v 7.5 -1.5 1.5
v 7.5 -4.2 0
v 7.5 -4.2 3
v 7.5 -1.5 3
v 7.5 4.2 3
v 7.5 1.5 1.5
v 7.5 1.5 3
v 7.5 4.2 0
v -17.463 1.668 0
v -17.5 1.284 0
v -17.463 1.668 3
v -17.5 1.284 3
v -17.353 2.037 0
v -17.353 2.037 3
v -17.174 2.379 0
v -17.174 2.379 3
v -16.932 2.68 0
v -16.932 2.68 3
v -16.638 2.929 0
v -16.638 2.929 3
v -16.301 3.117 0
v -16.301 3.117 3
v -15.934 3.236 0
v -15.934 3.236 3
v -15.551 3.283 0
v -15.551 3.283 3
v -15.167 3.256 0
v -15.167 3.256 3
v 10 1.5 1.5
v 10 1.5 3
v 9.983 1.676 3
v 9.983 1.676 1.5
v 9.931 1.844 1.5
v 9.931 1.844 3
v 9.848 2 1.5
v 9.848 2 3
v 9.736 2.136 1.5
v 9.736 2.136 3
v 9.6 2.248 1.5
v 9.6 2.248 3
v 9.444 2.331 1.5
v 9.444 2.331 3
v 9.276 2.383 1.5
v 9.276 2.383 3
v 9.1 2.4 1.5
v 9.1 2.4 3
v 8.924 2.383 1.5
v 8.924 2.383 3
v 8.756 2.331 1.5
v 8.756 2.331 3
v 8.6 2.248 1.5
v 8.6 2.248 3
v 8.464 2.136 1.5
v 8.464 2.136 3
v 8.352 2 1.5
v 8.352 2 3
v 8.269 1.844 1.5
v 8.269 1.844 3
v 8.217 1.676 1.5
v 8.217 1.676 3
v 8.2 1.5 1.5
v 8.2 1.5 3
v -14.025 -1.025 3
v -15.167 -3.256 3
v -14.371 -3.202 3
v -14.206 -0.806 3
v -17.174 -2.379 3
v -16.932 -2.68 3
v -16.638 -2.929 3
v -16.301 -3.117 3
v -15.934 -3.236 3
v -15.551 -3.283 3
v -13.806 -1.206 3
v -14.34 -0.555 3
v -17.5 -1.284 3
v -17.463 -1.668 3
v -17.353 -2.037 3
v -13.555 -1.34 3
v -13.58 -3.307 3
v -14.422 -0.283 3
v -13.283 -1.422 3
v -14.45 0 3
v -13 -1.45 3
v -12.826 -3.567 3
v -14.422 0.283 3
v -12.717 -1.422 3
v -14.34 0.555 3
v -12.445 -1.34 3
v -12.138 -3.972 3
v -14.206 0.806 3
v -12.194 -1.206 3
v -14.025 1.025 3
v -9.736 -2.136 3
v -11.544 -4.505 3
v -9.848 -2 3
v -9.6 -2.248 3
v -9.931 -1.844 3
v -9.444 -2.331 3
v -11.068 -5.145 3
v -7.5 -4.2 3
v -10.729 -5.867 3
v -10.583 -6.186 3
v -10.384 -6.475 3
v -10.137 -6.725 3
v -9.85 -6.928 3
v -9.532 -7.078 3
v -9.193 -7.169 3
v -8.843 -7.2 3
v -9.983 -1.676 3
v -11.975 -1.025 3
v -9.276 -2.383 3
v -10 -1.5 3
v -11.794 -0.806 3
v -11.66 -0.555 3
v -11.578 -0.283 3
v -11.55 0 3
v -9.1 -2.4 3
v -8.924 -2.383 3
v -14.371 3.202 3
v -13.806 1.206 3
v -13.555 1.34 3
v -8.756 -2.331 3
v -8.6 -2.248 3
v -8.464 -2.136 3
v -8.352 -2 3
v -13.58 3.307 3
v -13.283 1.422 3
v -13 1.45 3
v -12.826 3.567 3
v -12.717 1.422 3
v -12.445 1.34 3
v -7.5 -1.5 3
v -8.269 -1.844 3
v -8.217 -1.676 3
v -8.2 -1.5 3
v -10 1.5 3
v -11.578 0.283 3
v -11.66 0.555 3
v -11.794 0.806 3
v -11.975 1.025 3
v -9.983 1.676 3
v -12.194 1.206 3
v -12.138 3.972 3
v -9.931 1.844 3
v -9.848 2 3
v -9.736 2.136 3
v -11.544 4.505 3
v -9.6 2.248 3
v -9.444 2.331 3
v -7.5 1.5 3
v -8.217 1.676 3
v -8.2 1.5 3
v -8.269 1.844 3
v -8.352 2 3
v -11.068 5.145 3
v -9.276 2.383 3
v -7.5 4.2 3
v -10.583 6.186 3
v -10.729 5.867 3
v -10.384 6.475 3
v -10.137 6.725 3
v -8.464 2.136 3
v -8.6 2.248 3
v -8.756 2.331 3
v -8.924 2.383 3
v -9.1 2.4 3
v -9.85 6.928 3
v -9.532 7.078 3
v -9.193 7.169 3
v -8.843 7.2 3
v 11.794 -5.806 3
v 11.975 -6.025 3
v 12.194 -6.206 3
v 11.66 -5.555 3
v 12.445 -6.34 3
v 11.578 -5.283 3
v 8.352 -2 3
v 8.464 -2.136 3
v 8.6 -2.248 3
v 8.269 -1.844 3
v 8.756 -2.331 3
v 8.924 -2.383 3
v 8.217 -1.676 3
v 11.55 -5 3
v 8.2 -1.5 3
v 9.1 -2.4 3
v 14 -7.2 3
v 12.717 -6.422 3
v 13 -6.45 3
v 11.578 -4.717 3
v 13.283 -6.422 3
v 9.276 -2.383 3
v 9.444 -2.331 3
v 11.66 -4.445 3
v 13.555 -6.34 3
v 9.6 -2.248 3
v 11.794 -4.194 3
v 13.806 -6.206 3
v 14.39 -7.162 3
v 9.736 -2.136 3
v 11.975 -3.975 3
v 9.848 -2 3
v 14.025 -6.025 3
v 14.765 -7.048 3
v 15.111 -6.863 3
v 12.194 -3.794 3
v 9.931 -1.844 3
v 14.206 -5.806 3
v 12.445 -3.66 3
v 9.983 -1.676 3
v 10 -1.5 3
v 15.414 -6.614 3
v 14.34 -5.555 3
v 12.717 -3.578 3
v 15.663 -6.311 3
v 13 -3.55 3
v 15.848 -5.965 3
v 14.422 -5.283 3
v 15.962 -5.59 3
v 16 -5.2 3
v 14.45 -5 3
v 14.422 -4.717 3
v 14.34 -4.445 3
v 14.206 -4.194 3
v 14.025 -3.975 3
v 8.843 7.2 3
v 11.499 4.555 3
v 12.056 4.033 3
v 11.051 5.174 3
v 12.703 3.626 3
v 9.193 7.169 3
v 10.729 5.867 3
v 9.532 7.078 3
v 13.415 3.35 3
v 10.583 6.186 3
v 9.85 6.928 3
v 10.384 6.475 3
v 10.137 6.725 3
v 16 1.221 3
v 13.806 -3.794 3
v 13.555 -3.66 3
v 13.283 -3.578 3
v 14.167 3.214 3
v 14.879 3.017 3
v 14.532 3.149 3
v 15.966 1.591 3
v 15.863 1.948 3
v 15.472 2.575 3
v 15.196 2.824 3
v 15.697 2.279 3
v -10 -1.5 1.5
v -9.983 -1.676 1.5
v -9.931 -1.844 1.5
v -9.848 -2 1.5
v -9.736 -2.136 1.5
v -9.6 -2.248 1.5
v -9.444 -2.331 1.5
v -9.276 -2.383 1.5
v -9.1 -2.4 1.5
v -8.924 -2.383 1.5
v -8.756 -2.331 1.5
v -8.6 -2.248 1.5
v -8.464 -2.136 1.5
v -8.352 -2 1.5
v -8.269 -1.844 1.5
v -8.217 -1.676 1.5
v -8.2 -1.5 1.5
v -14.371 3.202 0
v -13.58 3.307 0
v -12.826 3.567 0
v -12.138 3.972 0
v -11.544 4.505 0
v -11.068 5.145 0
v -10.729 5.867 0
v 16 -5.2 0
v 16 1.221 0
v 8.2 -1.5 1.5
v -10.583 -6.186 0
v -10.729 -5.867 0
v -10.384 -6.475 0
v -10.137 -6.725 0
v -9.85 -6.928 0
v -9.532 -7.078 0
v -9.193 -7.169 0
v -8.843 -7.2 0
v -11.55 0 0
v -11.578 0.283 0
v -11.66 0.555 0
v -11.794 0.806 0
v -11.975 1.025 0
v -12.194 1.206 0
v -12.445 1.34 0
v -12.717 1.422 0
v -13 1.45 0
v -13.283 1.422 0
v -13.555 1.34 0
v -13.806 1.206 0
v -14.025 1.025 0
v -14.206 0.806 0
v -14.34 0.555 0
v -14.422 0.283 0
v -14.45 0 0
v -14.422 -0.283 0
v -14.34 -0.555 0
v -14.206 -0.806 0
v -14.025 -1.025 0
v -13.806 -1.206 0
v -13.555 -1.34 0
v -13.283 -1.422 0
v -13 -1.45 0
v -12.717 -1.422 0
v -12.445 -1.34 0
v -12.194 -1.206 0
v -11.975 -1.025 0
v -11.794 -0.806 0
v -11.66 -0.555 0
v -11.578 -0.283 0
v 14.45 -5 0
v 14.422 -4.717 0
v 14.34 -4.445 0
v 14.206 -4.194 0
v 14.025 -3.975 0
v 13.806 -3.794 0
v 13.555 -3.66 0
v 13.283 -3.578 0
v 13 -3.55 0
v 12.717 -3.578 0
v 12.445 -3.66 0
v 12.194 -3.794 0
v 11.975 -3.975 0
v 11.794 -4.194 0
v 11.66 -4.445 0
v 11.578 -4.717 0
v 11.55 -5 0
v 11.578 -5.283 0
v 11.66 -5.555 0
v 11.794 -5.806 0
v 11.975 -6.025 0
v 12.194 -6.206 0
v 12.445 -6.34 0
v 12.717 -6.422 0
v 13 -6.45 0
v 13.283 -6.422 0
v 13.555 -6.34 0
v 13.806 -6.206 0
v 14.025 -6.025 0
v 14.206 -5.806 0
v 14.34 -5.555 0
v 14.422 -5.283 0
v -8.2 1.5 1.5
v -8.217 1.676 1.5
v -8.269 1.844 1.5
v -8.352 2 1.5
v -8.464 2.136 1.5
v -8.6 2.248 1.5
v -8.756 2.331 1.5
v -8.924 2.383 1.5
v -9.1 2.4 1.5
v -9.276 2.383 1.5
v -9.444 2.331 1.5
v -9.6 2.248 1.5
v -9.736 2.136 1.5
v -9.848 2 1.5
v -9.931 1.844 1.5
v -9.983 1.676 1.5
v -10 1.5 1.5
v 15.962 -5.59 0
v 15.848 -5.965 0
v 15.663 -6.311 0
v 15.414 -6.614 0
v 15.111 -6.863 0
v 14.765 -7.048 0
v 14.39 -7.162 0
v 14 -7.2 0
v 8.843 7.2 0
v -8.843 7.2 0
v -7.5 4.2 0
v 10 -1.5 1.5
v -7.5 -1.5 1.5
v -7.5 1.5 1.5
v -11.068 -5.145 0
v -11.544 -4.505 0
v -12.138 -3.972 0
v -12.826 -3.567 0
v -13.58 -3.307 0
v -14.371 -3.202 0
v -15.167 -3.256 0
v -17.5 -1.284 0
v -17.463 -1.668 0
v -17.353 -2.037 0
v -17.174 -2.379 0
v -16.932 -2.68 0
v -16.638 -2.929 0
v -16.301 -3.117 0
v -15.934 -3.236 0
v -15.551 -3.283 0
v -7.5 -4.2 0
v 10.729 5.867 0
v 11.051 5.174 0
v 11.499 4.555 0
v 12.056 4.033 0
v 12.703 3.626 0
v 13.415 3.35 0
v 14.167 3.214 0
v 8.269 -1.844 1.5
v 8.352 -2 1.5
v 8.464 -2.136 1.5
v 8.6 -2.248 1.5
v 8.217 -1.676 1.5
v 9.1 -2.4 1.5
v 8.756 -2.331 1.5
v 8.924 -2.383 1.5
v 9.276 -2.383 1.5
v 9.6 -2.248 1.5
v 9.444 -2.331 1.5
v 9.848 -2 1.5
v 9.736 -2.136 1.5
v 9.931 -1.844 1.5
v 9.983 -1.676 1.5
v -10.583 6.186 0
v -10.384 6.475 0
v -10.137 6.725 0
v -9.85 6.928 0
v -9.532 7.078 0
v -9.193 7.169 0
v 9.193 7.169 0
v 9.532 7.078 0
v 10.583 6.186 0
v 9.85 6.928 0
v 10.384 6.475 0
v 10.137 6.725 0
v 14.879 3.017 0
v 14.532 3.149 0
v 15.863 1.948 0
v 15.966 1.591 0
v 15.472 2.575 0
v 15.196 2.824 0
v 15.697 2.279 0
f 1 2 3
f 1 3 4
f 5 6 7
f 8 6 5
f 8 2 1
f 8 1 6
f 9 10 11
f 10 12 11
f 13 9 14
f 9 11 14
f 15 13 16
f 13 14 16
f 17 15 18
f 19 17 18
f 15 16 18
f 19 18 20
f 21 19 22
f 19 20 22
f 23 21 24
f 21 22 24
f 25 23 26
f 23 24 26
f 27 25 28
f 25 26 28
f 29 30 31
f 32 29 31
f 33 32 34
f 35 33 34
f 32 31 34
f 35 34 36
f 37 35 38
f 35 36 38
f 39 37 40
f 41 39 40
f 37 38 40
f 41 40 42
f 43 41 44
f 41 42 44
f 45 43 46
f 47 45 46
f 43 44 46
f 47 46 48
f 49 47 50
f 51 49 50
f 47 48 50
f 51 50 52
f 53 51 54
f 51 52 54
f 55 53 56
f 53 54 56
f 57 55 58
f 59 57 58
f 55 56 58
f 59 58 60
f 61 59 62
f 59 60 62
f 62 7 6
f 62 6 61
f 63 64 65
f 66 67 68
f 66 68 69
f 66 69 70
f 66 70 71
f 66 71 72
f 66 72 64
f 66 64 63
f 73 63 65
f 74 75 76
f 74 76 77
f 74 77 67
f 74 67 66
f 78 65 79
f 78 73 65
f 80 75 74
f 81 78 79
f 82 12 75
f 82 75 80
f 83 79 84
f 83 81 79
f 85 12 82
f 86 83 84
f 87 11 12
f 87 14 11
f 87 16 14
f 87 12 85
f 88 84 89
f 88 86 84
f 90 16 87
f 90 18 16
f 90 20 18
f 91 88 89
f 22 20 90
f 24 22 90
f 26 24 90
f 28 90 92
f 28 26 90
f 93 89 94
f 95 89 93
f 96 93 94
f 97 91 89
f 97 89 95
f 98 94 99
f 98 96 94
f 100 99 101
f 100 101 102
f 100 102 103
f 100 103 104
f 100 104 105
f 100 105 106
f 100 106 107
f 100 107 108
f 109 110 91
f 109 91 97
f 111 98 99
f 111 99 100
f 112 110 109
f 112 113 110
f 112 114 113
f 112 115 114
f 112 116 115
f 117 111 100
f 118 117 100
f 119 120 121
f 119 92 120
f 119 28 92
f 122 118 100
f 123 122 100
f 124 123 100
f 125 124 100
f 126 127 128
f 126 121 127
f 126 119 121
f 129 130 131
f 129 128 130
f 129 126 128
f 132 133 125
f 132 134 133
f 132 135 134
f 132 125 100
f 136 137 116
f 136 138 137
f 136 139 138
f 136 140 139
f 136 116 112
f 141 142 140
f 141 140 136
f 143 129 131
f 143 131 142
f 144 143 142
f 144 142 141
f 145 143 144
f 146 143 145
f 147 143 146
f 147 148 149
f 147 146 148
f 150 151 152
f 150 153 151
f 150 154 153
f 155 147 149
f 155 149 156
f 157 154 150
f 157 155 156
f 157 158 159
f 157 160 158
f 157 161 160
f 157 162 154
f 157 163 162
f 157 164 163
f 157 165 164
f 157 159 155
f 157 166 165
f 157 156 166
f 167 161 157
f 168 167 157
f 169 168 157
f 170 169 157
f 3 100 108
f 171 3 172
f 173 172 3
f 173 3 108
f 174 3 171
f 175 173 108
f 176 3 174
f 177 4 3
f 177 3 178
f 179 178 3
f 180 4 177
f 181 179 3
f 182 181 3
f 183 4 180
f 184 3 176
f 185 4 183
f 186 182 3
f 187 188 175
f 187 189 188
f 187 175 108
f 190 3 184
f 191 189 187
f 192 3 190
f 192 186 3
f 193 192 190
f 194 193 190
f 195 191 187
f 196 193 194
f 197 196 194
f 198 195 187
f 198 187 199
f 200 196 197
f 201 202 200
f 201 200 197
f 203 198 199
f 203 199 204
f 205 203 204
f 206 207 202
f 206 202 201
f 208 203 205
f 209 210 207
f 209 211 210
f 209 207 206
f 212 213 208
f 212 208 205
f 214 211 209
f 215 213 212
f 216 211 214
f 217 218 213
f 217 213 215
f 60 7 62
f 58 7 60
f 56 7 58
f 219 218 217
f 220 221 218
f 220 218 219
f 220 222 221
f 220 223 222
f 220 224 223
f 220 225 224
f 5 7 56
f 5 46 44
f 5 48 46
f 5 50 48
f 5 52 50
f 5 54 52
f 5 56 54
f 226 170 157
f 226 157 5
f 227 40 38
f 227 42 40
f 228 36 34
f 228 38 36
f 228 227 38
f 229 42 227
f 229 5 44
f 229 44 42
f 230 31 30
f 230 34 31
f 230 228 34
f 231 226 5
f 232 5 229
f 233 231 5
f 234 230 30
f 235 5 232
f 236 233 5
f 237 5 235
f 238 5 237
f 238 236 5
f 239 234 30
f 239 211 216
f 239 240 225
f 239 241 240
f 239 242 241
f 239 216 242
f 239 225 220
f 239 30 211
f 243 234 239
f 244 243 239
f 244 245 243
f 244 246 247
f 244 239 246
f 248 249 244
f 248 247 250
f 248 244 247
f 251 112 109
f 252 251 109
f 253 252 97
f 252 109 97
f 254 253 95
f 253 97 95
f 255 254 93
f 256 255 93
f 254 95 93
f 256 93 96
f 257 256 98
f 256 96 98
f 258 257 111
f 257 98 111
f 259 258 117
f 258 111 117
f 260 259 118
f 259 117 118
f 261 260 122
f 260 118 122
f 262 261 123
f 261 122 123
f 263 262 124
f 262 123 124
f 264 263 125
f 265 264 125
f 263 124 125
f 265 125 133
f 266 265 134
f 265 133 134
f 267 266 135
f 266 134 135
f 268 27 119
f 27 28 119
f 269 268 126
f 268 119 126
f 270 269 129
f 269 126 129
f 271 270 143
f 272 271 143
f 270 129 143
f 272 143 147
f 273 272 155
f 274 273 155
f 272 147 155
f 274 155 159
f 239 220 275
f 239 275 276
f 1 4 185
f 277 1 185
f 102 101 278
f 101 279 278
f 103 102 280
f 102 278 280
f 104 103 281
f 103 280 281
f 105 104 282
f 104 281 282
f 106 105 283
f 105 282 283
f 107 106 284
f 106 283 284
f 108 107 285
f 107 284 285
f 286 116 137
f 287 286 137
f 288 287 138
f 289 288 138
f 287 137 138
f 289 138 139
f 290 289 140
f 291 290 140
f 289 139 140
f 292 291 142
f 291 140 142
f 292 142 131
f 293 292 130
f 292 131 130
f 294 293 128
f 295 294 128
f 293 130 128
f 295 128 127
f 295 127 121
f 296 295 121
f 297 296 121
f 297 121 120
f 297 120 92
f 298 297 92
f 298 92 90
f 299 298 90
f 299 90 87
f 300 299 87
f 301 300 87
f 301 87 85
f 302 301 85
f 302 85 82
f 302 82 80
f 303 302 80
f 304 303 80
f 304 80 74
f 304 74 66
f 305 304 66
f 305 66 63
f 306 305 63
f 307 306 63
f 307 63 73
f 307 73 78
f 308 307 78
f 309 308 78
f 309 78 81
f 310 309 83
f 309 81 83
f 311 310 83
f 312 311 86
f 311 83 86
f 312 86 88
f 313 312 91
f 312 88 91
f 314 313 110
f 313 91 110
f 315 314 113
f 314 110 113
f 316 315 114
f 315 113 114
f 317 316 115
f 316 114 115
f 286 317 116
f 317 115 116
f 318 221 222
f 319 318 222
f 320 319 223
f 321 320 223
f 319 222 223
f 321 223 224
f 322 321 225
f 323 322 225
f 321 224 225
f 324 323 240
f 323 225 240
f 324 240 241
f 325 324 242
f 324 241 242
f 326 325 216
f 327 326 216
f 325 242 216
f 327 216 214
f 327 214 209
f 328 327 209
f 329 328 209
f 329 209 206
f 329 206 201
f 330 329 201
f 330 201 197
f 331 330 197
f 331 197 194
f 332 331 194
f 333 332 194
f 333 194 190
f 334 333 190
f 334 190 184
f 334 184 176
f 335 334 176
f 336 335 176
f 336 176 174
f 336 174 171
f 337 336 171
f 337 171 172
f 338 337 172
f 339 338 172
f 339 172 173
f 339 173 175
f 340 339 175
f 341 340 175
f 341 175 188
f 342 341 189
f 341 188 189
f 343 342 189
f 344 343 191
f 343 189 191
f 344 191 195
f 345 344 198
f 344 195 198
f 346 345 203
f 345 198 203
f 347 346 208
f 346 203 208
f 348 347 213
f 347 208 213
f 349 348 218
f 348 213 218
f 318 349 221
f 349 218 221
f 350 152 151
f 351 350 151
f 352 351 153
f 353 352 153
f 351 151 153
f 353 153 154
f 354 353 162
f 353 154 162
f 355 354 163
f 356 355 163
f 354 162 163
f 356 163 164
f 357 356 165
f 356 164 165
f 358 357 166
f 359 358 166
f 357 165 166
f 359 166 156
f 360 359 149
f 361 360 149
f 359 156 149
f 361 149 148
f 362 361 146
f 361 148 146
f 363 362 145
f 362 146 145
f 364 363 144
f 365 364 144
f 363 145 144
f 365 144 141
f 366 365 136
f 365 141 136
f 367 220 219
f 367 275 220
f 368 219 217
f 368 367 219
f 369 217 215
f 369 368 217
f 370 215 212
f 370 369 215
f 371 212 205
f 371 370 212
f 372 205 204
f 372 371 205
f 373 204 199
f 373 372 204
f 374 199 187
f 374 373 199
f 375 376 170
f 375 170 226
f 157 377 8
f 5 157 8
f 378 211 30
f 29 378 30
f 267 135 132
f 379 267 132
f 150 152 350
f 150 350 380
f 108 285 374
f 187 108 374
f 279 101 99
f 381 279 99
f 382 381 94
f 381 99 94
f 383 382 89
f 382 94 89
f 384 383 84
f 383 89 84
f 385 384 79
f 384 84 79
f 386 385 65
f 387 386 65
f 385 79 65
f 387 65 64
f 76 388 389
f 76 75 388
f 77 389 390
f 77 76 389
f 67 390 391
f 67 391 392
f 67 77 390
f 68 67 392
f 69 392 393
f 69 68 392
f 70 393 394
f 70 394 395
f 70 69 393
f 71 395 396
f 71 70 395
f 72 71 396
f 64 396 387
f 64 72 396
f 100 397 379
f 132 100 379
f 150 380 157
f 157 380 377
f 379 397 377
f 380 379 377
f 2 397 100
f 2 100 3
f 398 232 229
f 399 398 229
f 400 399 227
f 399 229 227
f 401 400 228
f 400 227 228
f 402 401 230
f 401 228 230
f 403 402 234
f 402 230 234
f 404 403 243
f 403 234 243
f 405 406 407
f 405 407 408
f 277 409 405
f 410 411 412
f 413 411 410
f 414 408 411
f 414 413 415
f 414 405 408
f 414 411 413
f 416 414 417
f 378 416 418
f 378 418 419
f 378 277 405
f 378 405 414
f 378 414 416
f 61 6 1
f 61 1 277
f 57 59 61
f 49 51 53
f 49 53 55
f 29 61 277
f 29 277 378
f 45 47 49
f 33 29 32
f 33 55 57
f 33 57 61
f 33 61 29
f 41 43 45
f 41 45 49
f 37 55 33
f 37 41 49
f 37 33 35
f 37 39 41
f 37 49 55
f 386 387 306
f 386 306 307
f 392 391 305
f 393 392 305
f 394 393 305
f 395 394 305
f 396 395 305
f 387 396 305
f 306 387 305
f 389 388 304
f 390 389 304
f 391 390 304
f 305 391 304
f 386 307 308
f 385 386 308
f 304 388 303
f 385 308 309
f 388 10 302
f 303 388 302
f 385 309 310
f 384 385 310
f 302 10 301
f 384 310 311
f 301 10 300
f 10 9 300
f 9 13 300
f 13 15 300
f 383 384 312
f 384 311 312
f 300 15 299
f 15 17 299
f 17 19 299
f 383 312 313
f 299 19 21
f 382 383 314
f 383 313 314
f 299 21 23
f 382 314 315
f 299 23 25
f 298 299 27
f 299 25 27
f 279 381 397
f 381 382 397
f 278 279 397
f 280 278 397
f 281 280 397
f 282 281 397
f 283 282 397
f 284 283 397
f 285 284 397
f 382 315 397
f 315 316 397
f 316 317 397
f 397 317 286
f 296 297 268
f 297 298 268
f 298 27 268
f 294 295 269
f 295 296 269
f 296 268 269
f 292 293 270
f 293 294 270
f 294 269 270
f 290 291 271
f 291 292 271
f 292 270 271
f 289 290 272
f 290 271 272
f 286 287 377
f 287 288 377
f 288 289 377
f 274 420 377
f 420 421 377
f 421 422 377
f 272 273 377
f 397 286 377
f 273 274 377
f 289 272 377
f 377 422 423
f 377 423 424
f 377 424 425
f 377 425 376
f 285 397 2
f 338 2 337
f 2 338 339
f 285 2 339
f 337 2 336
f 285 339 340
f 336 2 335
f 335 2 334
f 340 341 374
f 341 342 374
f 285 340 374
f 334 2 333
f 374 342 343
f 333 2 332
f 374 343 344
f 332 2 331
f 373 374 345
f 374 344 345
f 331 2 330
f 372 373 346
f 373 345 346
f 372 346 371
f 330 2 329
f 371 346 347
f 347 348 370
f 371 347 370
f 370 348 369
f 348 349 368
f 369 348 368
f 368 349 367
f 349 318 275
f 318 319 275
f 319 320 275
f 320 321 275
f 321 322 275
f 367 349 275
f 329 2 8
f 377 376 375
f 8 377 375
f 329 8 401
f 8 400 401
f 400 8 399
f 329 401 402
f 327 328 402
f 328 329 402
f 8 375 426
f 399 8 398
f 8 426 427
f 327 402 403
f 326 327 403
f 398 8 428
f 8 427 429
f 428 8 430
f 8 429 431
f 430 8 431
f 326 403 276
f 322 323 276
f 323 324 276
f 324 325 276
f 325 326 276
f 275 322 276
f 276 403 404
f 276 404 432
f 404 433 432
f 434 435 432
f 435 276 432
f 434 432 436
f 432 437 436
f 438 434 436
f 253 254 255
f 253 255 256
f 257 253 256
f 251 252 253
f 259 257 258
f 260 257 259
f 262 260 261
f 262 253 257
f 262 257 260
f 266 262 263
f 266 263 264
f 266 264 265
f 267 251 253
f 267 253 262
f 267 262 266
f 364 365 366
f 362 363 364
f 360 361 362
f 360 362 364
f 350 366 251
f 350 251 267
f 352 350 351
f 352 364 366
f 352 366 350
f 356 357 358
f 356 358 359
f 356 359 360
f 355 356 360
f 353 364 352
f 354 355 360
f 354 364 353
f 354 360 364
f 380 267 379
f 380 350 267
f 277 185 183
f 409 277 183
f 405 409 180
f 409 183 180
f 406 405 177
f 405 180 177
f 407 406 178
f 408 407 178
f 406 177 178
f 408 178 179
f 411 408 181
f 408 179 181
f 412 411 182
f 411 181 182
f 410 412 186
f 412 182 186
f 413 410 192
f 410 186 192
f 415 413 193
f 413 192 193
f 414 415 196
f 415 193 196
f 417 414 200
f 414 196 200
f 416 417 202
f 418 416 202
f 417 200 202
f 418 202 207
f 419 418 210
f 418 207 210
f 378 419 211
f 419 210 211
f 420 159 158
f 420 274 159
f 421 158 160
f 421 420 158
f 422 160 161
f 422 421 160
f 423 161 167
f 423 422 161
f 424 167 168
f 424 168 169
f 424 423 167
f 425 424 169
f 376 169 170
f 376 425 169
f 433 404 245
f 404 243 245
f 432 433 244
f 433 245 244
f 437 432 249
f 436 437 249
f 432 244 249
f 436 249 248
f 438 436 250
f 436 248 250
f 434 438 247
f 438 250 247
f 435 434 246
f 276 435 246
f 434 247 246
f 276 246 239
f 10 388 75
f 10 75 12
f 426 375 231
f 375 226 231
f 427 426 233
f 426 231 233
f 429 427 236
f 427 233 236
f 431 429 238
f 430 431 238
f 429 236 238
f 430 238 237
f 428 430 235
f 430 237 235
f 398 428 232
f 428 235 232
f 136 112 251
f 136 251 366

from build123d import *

# Parameters (mm, degrees)
SKETCH_1_W          = 35
SKETCH_1_H          = 14.4
SKETCH_1_W_2        = 15
SKETCH_1_H_2        = 8.4
EXTRUDE_1_DEPTH     = 3
SKETCH_2_W          = 20
SKETCH_2_H          = 3
CUT_EXTRUDE_1_DEPTH = 1.5
SKETCH_3_R          = 1.45
CUT_EXTRUDE_2_DEPTH = 20
SKETCH_5_R          = 4
CUT_EXTRUDE_4_DEPTH = 10
SKETCH_9_W          = 1.5
SKETCH_9_H          = 14.4
CUT_EXTRUDE_7_DEPTH = 20.159592898
FILLET_2_R          = 2
SKETCH_6_R          = 0.9
CUT_EXTRUDE_5_DEPTH = 1.5
SKETCH_7_R          = 1.45
CUT_EXTRUDE_6_DEPTH = 20.159592898


with BuildPart() as part:
    # 草图1 → 凸台-拉伸1 (new body)
    with BuildSketch(Plane.XY):
        Rectangle(SKETCH_1_W, SKETCH_1_H)
        Rectangle(SKETCH_1_W_2, SKETCH_1_H_2, mode=Mode.SUBTRACT)
    extrude(amount=EXTRUDE_1_DEPTH)

    # 草图2 → 切除-拉伸1 (cut)
    with BuildSketch(Plane.XY.offset(3)):
        Rectangle(SKETCH_2_W, SKETCH_2_H)
    extrude(amount=-CUT_EXTRUDE_1_DEPTH, mode=Mode.SUBTRACT)

    # 草图3 → 切除-拉伸2 (cut)
    with BuildSketch(Plane.XY.offset(3)):
        with Locations((-13, 0)):
            Circle(SKETCH_3_R)
    extrude(amount=-CUT_EXTRUDE_2_DEPTH, mode=Mode.SUBTRACT)

    # 草图5 → 切除-拉伸4 (cut)
    with BuildSketch(Plane.XY.offset(3)):
        with Locations((-14.5, 7.2)):
            Circle(SKETCH_5_R)
        with Locations((14.5, 7.2)):
            Circle(SKETCH_5_R)
        with Locations((-14.5, -7.2)):
            Circle(SKETCH_5_R)
    extrude(amount=-CUT_EXTRUDE_4_DEPTH, mode=Mode.SUBTRACT)

    # 草图9 → 切除-拉伸7 (cut, through all)
    with BuildSketch(Plane.XY.offset(3)):
        with Locations((16.75, 0)):
            Rectangle(SKETCH_9_W, SKETCH_9_H)
    extrude(amount=-CUT_EXTRUDE_7_DEPTH, mode=Mode.SUBTRACT)

    # 圆角2
    fillet_2_edges = [part.edges().sort_by_distance(p)[0] for p in [
        (16, -7.2, 1.5),
        (-10.5, -7.2, 1.5),
        (-17.5, 4.554248689, 1.5),
        (10.5, 7.2, 1.5),
        (-17.5, -4.554248689, 1.5),
        (-10.5, 7.2, 1.5),
        (16, 3.491900756, 1.5),
    ]]
    fillet(fillet_2_edges, radius=FILLET_2_R)

    # 草图6 → 切除-拉伸5 (cut)
    with BuildSketch(Plane.XY.offset(3)):
        with Locations((-9.1, 1.5)):
            Circle(SKETCH_6_R)
        with Locations((-9.1, -1.5)):
            Circle(SKETCH_6_R)
        with Locations((9.1, 1.5)):
            Circle(SKETCH_6_R)
        with Locations((9.1, -1.5)):
            Circle(SKETCH_6_R)
    extrude(amount=-CUT_EXTRUDE_5_DEPTH, mode=Mode.SUBTRACT)

    # 草图7 → 切除-拉伸6 (cut, through all)
    with BuildSketch(Plane.XY.offset(3)):
        with Locations((13, -5)):
            Circle(SKETCH_7_R)
    extrude(amount=-CUT_EXTRUDE_6_DEPTH, mode=Mode.SUBTRACT)


solid = part.part
